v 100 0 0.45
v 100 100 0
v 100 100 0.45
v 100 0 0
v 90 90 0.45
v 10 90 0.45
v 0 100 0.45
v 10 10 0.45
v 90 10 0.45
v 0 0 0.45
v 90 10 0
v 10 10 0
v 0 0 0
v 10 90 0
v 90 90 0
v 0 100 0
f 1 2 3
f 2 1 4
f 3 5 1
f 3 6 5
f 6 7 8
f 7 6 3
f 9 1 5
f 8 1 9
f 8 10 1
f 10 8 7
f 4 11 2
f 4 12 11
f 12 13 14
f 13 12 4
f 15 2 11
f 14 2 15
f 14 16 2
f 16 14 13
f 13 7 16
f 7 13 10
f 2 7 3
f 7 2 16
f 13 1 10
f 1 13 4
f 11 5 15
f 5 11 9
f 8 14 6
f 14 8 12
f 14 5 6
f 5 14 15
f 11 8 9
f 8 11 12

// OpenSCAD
//Made By Selim Tanriverdi

//adjust "layerh" to your layer height 
//adjust "layers" for how many layers you want to print
layerh = .15; //Layer Height
layers = 3;

difference()
{
cube([100,100,layers*layerh]);
translate([10,10,0]) cube([100-20,100-20,layers*layerh]);
}
